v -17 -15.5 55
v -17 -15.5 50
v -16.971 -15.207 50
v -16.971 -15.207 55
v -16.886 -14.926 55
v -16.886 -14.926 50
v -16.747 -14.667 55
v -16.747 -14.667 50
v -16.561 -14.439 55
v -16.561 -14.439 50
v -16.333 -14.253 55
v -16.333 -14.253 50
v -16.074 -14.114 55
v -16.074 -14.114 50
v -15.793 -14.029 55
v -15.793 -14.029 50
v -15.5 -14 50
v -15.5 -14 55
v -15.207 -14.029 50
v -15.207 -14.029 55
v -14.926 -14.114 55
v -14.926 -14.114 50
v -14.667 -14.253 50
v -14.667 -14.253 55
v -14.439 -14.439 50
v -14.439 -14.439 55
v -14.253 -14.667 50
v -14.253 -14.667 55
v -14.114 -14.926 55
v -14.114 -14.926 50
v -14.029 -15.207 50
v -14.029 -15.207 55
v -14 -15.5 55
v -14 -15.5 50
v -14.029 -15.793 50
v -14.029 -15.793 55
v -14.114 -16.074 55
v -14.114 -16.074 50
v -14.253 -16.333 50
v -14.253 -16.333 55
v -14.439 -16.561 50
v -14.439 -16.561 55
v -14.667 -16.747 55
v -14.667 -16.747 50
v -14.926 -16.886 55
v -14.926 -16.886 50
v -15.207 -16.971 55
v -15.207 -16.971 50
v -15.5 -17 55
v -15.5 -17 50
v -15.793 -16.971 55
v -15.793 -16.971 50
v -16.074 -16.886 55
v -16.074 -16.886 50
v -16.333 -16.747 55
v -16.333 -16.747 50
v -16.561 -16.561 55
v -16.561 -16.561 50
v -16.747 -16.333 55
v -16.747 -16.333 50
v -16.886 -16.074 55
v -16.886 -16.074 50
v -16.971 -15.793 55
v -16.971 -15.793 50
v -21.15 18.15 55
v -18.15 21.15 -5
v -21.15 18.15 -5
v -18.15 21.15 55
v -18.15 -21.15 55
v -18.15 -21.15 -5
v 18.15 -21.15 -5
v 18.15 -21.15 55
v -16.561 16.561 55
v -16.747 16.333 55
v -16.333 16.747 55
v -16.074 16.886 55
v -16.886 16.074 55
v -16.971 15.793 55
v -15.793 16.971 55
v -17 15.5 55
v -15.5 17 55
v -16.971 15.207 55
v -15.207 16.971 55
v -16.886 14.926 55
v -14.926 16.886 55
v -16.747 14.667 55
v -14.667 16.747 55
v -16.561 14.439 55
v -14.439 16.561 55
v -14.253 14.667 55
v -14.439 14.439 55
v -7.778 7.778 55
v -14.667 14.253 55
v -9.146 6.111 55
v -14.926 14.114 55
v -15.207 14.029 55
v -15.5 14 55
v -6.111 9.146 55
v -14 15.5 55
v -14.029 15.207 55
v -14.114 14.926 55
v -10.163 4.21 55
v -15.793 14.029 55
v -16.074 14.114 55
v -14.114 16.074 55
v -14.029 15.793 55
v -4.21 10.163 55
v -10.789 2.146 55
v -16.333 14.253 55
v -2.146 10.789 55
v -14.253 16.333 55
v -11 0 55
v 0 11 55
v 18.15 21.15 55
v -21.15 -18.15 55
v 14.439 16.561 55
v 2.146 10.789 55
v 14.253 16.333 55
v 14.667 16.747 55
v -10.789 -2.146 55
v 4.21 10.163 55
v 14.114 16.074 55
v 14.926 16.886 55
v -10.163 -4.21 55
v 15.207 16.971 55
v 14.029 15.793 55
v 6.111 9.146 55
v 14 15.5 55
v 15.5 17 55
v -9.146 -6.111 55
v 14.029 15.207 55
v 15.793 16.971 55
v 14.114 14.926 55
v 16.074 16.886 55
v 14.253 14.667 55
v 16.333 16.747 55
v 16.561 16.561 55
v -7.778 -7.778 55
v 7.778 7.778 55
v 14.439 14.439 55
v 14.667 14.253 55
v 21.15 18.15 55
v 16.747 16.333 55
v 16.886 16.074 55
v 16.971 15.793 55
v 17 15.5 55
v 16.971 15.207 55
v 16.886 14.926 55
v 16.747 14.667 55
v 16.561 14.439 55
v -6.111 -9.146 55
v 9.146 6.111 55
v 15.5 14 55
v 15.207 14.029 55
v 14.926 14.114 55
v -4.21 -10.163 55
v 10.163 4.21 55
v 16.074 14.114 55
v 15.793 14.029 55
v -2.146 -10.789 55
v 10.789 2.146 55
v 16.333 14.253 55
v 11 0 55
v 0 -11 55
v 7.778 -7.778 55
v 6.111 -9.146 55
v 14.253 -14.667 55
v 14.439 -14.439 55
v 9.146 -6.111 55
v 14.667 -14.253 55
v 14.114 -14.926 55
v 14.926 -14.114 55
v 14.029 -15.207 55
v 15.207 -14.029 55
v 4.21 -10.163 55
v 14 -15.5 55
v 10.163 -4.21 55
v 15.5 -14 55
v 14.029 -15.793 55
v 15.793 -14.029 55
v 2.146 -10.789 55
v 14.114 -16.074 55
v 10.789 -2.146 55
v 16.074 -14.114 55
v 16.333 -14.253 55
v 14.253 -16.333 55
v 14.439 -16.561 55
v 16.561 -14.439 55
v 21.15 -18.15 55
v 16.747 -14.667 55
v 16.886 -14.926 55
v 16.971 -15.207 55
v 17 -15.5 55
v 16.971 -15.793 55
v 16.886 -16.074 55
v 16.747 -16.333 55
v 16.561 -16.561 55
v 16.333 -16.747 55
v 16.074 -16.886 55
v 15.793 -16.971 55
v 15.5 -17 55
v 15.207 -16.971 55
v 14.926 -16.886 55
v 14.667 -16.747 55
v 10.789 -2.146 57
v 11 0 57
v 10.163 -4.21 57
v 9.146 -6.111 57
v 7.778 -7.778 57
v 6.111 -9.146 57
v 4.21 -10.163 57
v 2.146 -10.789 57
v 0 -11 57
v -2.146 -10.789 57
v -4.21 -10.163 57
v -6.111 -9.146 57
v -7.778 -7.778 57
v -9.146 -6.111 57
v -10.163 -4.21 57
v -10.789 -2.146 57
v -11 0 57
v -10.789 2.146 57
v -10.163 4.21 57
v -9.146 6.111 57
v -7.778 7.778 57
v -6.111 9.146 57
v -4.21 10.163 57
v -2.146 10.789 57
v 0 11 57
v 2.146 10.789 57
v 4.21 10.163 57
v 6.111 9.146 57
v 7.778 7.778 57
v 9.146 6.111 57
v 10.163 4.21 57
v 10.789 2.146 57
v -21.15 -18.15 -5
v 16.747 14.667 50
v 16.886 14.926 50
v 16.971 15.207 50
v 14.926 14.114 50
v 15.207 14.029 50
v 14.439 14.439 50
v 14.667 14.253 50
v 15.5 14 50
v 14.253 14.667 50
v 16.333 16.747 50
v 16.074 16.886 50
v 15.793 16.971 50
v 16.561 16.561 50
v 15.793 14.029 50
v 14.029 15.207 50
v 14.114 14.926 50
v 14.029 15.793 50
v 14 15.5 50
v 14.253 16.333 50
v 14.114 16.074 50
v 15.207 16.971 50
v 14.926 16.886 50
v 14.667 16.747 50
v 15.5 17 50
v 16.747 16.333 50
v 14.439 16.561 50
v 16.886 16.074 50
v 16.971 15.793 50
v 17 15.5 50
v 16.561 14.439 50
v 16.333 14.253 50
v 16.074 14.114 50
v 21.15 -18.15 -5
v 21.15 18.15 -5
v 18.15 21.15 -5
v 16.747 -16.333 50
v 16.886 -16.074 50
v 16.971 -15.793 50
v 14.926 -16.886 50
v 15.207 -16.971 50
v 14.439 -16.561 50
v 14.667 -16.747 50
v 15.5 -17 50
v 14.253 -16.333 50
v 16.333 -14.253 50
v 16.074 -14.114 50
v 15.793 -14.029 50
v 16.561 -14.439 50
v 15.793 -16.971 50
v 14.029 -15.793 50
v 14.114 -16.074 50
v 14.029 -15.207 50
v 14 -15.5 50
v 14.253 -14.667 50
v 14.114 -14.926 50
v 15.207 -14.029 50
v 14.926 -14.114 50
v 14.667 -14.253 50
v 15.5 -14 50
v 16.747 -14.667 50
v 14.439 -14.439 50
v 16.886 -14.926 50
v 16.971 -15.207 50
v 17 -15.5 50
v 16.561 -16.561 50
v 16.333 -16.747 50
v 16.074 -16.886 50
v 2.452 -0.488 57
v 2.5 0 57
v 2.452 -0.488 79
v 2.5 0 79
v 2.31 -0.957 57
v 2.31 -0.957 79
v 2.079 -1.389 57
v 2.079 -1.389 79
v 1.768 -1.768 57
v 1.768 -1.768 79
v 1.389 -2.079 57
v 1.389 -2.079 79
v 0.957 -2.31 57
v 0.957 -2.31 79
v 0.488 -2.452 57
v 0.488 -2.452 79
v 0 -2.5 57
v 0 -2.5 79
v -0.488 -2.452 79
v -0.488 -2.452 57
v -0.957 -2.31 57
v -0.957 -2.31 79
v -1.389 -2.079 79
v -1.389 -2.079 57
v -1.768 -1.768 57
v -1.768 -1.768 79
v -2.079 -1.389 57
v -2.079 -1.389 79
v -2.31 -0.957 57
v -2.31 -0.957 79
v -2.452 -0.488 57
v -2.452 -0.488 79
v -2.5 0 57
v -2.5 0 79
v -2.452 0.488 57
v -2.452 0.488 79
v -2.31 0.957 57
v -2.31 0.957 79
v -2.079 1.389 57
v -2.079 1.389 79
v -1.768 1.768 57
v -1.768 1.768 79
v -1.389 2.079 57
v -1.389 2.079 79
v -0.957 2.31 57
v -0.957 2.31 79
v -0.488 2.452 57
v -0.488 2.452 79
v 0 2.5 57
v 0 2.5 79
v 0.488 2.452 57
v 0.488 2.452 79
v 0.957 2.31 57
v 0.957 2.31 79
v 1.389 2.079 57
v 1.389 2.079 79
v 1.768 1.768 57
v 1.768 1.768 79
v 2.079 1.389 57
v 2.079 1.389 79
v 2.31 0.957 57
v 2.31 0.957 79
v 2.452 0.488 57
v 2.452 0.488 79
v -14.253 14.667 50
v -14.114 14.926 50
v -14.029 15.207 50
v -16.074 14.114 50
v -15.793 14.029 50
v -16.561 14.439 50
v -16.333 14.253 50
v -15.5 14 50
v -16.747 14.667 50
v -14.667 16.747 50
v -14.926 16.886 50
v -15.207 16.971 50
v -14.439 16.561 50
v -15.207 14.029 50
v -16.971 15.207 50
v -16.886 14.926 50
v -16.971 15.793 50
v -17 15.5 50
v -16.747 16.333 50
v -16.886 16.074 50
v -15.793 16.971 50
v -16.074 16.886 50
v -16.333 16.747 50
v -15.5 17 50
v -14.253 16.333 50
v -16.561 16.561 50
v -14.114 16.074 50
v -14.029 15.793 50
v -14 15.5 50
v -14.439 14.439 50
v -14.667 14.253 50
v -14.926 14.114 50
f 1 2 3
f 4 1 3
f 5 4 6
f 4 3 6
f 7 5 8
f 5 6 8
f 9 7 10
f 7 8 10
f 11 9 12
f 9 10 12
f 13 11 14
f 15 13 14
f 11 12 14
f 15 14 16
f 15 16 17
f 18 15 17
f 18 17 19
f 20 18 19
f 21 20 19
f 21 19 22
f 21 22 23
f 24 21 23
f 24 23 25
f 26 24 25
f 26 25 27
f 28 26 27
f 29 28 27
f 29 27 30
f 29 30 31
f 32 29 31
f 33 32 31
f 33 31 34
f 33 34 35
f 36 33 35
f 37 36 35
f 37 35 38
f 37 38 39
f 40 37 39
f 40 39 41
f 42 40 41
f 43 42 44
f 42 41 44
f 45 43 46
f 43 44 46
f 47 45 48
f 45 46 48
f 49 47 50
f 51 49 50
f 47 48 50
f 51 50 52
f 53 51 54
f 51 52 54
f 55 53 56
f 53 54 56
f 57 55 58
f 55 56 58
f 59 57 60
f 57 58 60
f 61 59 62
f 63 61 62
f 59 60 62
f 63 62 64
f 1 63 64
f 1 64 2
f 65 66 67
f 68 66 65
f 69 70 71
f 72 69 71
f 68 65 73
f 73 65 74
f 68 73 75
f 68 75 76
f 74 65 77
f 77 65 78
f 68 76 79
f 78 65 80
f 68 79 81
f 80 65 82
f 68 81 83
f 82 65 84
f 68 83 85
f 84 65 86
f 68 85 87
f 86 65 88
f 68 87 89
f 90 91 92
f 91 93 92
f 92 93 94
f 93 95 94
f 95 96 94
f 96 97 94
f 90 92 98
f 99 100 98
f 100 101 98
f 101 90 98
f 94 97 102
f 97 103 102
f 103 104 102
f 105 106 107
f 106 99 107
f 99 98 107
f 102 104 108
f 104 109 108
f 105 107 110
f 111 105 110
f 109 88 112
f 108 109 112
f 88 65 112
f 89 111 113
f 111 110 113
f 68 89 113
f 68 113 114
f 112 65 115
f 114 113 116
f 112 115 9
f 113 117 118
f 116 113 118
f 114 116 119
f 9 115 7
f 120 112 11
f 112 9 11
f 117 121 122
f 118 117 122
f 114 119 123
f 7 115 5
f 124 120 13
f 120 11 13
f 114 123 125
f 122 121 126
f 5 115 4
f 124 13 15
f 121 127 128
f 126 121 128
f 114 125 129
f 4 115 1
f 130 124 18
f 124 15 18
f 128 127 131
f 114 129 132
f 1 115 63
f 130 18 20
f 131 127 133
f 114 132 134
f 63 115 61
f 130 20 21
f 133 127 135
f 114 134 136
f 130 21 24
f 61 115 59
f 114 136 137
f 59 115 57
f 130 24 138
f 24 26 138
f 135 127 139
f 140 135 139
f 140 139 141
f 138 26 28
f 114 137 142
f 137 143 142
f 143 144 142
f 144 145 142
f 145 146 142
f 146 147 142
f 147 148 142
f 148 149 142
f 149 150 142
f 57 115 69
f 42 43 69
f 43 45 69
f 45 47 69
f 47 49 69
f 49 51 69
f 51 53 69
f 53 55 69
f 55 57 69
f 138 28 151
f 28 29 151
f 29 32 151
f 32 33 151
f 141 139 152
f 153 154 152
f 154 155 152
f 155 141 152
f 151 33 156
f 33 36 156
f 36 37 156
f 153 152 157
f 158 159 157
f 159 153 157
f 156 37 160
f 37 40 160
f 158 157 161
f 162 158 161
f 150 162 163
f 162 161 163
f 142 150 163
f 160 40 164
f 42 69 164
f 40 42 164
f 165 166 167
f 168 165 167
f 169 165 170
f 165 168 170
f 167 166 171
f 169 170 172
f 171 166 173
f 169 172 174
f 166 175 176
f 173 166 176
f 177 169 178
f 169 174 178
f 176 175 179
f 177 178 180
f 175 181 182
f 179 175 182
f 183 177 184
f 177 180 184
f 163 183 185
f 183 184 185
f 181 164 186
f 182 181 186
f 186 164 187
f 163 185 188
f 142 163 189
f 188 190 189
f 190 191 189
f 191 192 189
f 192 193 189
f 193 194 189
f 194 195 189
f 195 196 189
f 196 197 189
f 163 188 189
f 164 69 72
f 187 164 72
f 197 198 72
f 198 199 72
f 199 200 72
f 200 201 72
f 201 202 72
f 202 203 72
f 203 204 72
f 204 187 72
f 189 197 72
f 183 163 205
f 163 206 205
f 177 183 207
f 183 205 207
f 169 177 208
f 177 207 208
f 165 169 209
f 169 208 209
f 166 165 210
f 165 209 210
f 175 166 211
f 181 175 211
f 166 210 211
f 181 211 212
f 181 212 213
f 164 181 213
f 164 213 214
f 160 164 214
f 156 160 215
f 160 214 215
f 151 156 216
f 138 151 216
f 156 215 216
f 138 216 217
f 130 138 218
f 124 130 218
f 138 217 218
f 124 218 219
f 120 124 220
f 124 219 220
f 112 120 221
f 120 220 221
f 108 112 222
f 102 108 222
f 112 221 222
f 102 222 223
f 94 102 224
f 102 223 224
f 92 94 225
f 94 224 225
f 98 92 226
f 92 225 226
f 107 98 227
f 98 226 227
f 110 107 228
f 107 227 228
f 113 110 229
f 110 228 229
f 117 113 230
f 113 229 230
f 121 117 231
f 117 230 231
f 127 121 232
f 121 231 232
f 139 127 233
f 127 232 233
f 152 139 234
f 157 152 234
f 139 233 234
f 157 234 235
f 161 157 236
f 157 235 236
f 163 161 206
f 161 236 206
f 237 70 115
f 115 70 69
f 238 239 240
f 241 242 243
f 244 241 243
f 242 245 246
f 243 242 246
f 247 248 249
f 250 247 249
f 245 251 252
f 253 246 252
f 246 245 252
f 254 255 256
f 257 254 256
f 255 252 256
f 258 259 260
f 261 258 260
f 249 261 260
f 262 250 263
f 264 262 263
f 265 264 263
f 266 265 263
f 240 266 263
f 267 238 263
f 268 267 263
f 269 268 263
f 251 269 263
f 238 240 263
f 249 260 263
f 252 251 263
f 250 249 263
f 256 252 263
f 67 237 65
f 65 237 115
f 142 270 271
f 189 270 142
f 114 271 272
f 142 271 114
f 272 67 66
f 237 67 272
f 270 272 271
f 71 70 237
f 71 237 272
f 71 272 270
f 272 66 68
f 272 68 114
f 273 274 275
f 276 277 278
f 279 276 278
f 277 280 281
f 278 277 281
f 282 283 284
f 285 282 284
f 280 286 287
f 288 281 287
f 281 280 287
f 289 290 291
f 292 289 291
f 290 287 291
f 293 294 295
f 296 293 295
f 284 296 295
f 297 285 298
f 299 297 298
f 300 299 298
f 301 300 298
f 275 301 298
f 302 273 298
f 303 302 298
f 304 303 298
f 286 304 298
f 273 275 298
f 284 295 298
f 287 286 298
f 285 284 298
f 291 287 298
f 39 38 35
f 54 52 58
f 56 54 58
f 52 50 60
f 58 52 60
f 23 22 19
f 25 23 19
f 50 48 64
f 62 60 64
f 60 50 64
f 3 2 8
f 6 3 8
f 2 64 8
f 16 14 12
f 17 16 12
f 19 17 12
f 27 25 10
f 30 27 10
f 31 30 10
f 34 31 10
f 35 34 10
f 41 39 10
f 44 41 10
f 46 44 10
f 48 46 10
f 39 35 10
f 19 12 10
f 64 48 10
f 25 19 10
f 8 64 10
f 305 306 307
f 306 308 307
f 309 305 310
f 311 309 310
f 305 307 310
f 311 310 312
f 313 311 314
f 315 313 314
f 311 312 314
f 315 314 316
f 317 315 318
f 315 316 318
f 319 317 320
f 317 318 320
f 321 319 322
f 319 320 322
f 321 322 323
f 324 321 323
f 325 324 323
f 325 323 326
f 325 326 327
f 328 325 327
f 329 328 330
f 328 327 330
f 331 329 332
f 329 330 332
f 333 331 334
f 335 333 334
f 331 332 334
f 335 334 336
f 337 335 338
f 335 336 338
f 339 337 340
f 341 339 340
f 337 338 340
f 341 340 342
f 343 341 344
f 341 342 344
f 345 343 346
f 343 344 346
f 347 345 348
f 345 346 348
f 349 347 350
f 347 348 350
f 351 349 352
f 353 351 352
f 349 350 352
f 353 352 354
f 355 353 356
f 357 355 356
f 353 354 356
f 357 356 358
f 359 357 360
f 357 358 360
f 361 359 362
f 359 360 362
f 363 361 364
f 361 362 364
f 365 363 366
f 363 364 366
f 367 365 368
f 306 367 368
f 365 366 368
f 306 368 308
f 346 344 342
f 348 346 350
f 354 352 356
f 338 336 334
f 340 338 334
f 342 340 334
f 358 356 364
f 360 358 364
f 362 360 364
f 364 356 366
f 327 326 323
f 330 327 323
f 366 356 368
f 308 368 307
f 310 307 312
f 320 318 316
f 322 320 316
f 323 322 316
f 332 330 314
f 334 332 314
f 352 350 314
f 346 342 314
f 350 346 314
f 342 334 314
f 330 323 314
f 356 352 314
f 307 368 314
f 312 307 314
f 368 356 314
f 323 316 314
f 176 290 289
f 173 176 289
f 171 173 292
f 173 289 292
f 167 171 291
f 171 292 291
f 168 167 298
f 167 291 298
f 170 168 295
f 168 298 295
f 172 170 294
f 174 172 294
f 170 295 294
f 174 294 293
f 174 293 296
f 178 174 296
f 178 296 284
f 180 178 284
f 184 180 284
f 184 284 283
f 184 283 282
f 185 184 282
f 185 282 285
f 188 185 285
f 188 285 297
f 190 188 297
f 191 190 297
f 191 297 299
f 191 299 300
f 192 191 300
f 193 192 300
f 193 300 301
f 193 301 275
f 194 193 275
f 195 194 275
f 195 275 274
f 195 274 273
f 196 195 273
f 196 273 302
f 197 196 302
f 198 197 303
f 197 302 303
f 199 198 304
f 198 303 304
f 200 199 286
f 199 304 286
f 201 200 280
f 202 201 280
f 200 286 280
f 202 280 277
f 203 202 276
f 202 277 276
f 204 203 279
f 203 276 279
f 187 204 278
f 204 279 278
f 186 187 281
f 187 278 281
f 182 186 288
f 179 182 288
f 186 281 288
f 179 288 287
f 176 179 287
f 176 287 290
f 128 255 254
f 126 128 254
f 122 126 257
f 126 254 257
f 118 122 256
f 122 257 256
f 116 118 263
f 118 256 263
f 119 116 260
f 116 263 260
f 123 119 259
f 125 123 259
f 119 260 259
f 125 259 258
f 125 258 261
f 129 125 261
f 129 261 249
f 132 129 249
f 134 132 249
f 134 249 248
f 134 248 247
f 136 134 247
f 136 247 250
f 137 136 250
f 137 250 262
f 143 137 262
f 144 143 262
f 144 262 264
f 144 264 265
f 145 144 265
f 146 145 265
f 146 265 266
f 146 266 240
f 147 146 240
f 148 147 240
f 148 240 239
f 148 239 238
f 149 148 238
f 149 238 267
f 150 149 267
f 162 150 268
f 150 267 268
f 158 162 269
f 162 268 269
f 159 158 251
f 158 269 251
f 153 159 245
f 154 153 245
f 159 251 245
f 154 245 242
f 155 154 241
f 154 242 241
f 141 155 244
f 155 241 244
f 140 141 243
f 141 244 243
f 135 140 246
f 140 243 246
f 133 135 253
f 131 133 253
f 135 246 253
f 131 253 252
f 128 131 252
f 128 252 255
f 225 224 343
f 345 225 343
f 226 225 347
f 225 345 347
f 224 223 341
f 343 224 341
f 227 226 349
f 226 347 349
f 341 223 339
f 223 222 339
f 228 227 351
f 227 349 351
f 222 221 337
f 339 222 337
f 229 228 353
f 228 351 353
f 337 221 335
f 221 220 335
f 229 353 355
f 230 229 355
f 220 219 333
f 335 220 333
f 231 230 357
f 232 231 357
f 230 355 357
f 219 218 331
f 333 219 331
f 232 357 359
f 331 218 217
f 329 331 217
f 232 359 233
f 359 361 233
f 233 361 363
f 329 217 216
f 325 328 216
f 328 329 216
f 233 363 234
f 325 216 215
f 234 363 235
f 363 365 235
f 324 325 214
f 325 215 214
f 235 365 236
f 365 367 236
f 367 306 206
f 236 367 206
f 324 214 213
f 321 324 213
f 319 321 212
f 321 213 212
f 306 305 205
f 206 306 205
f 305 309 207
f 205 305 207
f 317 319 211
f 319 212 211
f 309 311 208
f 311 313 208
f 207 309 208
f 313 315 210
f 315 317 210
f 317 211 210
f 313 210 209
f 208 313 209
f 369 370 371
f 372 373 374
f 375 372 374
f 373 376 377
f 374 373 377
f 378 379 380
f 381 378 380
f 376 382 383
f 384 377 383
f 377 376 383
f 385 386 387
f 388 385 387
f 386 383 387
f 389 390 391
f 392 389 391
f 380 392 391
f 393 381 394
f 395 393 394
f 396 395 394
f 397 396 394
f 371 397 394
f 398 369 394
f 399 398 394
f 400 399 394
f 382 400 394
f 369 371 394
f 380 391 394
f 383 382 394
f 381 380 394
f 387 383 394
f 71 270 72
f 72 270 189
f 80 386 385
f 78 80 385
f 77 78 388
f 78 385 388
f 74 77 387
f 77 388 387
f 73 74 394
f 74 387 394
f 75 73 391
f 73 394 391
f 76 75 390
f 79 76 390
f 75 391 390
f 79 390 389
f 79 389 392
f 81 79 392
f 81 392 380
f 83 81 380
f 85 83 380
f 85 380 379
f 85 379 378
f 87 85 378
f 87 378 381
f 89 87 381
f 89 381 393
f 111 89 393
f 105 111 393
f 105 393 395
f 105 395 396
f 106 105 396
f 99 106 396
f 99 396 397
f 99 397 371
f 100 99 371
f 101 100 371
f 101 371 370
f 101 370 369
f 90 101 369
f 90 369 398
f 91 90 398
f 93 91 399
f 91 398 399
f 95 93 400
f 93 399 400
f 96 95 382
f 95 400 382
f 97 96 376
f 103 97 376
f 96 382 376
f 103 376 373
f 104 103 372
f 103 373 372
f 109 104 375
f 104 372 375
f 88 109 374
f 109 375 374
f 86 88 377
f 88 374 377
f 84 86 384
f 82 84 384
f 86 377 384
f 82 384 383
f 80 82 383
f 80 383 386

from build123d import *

# Parameters (mm, degrees)
SKETCH_1_W                = 42.3
SKETCH_1_H                = 60
EXTRUDE_1_DEPTH           = 42.3
HOLE_WIZARD_3_0_3_1_D     = 3
HOLE_WIZARD_3_0_3_1_DEPTH = 5
CHAMFER_1_SIZE            = 3


with BuildPart() as part:
    # 草图1 → 凸台-拉伸1 (new body)
    with BuildSketch(Plane.XZ.offset(21.15)):
        with Locations((0, 25)):
            Rectangle(SKETCH_1_W, SKETCH_1_H)
    extrude(amount=-EXTRUDE_1_DEPTH)

    # 草图2 → 旋转1 (revolve)
    with BuildSketch(Plane.XZ):
        Polygon((2.5, 79), (0, 79), (0, 55), (11, 55), (11, 57), (2.5, 57), align=None)
    revolve(axis=Axis((0, 0, 79), (0, 0, -1)))

    # Ø3.0 (3) 直径孔1
    with Locations(Plane.XY.offset(55)):
        with Locations((15.5, -15.5), (-15.5, -15.5), (-15.5, 15.5), (15.5, 15.5)):
            Hole(HOLE_WIZARD_3_0_3_1_D / 2, depth=HOLE_WIZARD_3_0_3_1_DEPTH)

    # 倒角1
    chamfer_1_edges = [part.edges().sort_by_distance(p)[0] for p in [
        (-21.15, 21.15, 25),
        (21.15, 21.15, 25),
        (-21.15, -21.15, 25),
        (21.15, -21.15, 25),
    ]]
    chamfer(chamfer_1_edges, length=CHAMFER_1_SIZE)


solid = part.part
